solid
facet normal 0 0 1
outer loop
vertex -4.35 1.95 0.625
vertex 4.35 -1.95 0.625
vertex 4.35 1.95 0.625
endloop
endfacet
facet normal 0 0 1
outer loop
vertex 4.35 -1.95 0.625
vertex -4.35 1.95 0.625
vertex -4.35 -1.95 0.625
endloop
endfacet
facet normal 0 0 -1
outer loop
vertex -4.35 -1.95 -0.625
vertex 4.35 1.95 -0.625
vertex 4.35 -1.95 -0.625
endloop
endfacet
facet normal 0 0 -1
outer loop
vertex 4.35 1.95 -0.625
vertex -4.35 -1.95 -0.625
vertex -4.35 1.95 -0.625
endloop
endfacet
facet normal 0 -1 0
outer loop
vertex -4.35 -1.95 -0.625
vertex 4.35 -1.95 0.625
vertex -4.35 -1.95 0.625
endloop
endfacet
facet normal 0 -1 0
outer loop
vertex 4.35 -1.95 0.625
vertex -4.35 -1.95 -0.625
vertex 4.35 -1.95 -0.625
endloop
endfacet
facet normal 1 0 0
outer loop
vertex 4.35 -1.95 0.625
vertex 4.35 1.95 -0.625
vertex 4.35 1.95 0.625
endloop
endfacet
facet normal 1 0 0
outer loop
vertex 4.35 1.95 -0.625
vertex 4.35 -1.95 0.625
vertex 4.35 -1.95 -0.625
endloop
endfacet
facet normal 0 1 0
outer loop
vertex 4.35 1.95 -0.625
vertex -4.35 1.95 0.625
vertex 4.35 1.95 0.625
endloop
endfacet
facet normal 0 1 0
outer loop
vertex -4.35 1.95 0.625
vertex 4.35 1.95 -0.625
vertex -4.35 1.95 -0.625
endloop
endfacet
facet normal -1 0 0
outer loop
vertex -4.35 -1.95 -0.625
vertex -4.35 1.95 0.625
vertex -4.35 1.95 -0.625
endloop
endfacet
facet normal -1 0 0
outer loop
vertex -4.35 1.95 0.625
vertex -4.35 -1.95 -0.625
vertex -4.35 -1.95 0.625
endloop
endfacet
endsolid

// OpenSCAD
module smd() {
    translate([-8.70/2, -3.90/2, -1.25/2])
        cube([8.70, 3.90, 1.25]);
}

smd();
